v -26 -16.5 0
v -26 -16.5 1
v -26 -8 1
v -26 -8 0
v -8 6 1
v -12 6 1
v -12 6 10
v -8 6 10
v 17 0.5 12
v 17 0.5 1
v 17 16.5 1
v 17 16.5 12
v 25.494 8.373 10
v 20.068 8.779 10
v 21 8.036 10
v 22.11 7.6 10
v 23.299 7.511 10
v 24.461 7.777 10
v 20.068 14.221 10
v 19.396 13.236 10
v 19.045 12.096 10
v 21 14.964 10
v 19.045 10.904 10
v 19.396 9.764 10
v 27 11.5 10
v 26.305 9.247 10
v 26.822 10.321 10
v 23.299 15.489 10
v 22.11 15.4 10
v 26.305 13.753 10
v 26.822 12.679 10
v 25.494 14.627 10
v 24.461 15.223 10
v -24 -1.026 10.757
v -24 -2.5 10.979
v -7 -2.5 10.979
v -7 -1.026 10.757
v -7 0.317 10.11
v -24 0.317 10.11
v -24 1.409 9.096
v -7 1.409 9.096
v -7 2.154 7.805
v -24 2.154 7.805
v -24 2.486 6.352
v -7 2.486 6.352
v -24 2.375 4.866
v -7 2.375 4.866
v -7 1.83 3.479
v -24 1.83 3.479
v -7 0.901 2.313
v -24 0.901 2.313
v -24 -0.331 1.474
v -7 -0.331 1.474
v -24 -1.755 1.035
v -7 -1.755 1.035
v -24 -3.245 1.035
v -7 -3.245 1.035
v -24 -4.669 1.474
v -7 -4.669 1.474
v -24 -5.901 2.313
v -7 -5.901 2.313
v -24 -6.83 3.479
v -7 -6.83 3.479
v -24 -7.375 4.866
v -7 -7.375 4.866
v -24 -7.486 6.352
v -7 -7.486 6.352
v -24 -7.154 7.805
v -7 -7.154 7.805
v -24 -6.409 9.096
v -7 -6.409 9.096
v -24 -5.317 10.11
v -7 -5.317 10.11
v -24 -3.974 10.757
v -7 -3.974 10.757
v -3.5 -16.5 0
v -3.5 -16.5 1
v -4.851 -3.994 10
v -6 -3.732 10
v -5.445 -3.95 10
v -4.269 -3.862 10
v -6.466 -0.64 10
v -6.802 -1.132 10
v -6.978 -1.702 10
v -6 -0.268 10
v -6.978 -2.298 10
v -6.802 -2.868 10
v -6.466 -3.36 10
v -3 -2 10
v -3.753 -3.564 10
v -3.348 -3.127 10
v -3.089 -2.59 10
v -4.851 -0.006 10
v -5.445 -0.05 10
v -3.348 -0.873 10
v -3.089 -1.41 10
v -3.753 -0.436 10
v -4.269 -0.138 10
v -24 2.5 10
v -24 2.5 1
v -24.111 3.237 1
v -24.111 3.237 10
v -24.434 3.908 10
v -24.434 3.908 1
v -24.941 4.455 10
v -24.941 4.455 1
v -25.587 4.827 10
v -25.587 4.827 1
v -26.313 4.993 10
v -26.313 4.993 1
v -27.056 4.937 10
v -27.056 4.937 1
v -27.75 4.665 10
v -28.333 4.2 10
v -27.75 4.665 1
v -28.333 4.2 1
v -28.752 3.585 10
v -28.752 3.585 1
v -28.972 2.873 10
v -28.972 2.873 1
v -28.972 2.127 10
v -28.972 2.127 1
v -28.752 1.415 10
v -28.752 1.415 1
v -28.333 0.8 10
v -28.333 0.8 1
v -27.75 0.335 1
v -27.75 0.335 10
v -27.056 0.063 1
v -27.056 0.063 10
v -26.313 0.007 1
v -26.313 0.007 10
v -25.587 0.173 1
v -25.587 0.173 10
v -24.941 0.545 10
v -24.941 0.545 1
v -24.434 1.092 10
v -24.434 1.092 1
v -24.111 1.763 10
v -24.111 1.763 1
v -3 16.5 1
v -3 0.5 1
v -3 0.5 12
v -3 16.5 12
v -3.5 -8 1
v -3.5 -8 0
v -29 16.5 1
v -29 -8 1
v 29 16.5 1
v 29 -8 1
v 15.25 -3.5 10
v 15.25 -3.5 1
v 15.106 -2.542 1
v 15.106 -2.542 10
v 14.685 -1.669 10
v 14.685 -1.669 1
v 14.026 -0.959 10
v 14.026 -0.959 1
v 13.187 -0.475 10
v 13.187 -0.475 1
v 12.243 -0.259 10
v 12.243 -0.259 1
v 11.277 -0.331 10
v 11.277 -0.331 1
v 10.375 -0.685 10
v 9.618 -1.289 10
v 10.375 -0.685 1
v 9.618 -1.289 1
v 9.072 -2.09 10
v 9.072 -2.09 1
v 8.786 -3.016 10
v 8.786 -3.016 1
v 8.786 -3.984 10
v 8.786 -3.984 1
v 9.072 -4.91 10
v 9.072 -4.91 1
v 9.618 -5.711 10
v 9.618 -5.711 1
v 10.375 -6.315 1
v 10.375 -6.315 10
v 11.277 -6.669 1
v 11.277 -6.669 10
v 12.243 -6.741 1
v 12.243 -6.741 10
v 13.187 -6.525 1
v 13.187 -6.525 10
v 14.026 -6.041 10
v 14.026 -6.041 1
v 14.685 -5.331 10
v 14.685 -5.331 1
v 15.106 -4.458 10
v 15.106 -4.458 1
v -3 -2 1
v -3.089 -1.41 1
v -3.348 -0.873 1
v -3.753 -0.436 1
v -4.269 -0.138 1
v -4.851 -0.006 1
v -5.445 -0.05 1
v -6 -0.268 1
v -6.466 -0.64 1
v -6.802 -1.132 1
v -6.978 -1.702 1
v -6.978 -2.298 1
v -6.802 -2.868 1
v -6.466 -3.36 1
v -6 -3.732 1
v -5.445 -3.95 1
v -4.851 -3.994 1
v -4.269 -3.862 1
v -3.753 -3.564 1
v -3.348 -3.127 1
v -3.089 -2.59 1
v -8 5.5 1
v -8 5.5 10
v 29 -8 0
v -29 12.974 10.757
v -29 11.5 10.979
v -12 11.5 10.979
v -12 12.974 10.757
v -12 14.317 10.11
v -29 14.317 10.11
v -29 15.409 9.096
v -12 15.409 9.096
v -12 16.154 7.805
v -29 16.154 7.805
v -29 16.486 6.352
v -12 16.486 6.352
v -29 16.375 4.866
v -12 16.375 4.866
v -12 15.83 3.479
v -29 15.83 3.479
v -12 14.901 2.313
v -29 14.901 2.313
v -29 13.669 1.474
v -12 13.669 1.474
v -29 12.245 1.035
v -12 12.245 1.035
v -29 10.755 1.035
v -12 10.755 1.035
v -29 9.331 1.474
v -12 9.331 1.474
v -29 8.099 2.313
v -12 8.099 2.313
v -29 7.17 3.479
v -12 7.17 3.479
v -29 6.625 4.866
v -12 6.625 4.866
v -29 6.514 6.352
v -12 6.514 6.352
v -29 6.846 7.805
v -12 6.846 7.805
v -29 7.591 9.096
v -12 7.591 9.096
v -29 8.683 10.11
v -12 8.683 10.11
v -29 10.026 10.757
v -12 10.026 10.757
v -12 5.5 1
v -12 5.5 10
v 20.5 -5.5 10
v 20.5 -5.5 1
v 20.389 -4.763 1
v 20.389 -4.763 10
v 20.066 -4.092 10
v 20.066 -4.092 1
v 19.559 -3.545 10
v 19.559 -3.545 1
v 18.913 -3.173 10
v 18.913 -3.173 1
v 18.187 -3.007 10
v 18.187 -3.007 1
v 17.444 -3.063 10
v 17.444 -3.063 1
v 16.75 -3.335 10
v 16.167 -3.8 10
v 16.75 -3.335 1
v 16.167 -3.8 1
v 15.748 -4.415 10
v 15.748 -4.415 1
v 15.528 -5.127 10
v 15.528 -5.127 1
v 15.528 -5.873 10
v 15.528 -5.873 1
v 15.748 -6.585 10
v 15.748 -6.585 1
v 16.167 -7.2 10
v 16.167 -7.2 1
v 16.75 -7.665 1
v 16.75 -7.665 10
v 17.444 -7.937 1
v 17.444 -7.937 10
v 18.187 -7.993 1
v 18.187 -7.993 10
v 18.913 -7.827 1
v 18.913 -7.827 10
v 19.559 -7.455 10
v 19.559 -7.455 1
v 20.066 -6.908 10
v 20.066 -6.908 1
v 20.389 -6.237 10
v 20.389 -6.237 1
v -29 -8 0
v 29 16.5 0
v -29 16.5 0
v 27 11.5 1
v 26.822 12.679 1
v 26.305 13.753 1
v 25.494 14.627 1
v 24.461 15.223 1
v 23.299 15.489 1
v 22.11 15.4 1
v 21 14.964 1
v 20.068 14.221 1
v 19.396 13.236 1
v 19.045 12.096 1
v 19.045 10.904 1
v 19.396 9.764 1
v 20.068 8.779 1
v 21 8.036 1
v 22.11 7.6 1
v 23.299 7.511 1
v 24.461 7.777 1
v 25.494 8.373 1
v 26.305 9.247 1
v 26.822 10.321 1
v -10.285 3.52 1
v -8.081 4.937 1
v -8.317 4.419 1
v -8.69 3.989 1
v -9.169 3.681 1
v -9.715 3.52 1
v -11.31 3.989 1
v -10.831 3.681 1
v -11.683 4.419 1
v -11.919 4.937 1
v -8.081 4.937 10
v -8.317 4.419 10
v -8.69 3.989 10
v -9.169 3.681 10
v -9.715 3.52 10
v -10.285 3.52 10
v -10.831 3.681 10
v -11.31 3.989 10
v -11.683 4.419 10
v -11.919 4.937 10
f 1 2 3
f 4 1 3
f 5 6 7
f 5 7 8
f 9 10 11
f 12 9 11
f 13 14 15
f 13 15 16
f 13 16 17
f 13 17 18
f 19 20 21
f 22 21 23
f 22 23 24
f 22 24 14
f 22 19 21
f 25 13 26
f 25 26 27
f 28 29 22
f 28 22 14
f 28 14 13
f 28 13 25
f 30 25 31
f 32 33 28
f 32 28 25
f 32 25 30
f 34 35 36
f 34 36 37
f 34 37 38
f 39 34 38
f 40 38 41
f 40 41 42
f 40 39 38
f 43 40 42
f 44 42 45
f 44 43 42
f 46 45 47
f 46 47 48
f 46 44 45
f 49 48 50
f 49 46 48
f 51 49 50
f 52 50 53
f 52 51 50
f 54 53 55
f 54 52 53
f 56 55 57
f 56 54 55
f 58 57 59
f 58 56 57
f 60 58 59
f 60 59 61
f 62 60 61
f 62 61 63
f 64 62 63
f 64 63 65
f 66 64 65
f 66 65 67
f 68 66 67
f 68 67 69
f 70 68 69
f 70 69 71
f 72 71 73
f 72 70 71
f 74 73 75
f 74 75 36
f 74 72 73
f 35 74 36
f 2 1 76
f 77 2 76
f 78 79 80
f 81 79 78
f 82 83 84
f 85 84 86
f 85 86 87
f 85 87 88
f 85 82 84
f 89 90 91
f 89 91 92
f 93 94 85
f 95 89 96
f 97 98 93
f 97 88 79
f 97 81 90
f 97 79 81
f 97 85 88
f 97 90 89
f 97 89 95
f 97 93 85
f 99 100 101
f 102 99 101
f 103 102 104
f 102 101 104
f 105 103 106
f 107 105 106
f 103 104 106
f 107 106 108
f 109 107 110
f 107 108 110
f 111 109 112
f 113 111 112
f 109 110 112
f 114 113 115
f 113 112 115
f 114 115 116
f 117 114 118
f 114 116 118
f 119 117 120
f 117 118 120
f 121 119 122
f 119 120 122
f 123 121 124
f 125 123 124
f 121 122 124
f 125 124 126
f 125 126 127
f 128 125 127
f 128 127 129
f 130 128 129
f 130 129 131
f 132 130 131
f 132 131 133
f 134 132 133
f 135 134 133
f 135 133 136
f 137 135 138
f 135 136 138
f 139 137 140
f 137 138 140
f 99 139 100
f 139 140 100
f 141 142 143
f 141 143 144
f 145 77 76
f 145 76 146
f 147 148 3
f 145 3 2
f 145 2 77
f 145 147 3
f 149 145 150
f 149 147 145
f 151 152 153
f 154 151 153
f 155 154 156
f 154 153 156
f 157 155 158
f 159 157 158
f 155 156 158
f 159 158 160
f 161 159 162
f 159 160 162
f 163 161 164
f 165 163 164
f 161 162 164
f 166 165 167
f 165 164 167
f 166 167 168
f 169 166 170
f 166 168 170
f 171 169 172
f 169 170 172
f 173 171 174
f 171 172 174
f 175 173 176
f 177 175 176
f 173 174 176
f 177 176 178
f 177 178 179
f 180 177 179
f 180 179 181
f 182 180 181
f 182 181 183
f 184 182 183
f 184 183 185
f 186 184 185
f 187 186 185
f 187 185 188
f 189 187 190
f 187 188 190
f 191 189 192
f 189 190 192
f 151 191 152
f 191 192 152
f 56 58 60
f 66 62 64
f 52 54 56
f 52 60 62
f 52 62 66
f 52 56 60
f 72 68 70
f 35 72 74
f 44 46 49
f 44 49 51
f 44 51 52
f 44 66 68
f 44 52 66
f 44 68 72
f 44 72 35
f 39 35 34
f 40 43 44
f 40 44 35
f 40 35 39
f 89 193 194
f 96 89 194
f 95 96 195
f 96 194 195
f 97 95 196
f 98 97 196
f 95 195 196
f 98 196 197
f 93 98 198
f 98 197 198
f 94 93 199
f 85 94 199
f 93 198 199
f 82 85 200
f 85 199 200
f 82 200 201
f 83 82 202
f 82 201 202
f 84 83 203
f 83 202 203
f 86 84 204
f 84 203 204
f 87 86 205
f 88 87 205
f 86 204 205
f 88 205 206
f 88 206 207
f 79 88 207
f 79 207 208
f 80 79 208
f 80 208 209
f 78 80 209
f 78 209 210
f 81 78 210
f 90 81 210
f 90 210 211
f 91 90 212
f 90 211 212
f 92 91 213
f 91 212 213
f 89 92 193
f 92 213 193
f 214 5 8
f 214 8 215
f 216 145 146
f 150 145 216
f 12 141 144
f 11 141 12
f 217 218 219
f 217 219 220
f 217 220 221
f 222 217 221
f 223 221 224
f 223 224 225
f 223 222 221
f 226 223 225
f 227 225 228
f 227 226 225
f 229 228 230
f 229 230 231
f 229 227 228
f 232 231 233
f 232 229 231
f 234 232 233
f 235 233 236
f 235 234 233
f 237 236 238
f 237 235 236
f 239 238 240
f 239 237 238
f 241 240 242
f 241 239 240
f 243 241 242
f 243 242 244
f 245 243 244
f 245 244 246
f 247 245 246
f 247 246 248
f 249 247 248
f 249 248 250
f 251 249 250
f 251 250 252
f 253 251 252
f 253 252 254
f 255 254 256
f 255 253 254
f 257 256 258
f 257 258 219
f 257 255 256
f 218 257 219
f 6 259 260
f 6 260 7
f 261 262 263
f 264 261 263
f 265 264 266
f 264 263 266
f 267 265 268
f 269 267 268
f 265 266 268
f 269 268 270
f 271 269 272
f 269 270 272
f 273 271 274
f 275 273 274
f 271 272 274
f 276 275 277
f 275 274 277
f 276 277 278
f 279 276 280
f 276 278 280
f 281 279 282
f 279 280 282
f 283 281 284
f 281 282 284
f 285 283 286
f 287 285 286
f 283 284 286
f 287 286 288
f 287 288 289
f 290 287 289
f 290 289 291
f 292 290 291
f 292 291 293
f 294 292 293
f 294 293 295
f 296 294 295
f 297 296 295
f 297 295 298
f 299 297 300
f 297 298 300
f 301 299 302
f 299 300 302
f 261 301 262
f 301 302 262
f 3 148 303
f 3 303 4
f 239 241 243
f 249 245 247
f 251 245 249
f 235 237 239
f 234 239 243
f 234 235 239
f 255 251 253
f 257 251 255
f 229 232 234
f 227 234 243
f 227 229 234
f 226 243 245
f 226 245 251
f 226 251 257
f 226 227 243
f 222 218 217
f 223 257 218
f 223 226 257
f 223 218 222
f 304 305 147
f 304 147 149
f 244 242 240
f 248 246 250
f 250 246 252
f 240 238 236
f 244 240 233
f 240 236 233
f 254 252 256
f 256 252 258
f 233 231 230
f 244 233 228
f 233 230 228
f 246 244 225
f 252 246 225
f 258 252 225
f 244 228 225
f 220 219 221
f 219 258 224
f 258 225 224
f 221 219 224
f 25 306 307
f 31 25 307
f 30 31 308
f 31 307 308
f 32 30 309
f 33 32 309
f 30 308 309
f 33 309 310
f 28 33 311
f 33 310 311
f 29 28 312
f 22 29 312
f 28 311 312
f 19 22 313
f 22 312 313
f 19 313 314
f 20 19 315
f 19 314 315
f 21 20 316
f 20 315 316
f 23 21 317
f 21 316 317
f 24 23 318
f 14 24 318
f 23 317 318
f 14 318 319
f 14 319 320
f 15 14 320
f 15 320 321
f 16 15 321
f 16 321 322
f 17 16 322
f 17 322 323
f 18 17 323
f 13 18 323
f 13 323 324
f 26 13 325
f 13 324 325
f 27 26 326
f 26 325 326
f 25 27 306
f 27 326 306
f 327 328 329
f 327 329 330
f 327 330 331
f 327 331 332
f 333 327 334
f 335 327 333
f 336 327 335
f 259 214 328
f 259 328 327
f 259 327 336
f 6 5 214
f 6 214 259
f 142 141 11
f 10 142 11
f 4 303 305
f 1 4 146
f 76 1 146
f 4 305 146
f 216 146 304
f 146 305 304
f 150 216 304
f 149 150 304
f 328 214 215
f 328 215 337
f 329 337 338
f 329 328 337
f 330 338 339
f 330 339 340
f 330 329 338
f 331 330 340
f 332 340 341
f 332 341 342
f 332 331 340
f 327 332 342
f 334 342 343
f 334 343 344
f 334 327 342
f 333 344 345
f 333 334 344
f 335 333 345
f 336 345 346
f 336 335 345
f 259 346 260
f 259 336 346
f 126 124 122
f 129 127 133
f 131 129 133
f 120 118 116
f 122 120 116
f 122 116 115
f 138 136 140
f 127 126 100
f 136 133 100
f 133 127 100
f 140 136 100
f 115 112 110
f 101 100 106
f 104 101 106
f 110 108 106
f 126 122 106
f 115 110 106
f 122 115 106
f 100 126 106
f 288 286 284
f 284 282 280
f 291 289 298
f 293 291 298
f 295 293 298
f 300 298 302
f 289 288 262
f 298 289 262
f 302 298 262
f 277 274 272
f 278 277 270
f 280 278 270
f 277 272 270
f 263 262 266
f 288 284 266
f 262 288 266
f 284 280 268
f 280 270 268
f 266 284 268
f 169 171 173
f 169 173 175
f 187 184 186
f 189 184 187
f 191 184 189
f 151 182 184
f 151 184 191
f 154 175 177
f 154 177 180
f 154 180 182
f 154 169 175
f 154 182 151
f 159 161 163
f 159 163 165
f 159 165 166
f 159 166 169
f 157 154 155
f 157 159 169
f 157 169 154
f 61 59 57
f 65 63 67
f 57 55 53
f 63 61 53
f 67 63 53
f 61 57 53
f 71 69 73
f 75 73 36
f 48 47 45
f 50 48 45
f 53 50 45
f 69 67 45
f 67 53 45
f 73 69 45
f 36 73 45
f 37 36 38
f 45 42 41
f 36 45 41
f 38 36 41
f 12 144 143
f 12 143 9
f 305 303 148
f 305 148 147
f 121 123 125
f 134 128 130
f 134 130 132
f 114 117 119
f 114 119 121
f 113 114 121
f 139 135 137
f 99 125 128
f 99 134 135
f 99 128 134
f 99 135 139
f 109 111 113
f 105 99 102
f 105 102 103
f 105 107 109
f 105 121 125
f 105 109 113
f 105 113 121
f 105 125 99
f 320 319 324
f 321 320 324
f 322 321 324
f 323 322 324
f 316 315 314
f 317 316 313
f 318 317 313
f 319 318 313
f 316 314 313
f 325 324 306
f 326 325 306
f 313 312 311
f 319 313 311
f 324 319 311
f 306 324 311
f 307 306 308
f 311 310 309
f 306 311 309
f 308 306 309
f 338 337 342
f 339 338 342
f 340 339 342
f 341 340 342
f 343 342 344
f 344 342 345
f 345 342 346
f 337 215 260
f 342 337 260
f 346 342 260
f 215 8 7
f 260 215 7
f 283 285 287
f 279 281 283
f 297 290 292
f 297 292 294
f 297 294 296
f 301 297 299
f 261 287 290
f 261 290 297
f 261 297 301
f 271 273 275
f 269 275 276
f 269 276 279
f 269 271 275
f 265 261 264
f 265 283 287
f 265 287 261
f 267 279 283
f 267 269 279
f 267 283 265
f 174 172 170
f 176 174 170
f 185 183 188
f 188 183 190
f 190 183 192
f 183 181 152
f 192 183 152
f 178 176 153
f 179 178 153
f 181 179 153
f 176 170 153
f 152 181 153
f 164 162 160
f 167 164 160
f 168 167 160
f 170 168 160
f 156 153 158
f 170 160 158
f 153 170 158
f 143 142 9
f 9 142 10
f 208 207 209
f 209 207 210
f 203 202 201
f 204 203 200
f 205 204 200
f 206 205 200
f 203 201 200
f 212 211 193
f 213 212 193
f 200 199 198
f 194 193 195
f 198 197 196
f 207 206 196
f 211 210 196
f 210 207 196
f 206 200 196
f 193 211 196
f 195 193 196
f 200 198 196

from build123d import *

# Parameters (mm, degrees)
ESBO_O1_W                  = 58
ESBO_O1_H                  = 33
RESSALTO_EXTRUS_O1_DEPTH   = 1
ESBO_O2_W                  = 3
ESBO_O2_H                  = 8.5
ESBO_O2_W_2                = 32.5
CORTE_EXTRUS_O1_DEPTH      = 2
ESBO_O3_W                  = 20
ESBO_O3_H                  = 16
RESSALTO_EXTRUS_O2_DEPTH   = 11
ESBO_O4_R                  = 3.25
RESSALTO_EXTRUS_O3_DEPTH   = 9
ESBO_O4_R_2                = 2.5
RESSALTO_EXTRUS_O3_2_DEPTH = 9
ESBO_O4_R_3                = 4
RESSALTO_EXTRUS_O3_3_DEPTH = 9
RESSALTO_EXTRUS_O3_4_DEPTH = 9
ESBO_O4_R_4                = 2
RESSALTO_EXTRUS_O3_5_DEPTH = 9
RESSALTO_EXTRUS_O3_6_DEPTH = 9
ESBO_O5_R                  = 5
RESSALTO_EXTRUS_O4_DEPTH   = 17
RESSALTO_EXTRUS_O5_START   = -5
ESBO_O6_R                  = 5
RESSALTO_EXTRUS_O5_DEPTH   = 17


with BuildPart() as part:
    # Esboço1 → Ressalto-extrusão1 (new body)
    with BuildSketch(Plane.XY):
        Rectangle(ESBO_O1_W, ESBO_O1_H)
    extrude(amount=RESSALTO_EXTRUS_O1_DEPTH)

    # Esboço2 → Corte-extrusão1 (cut, through all)
    with BuildSketch(Plane.XY.offset(1)):
        with Locations((-27.5, -12.25)):
            Rectangle(ESBO_O2_W, ESBO_O2_H)
        with Locations((12.75, -12.25)):
            Rectangle(ESBO_O2_W_2, ESBO_O2_H)
    extrude(amount=-CORTE_EXTRUS_O1_DEPTH, mode=Mode.SUBTRACT)


with BuildPart() as body_2:
    # Esboço3 → Ressalto-extrusão2 (new body)
    with BuildSketch(Plane.XY.offset(1)):
        with Locations((7, 8.5)):
            Rectangle(ESBO_O3_W, ESBO_O3_H)
    extrude(amount=RESSALTO_EXTRUS_O2_DEPTH)


with BuildPart() as body_3:
    # Esboço4 → Ressalto-extrusão3 (new body)
    with BuildSketch(Plane.XY.offset(1)):
        with Locations((12, -3.5)):
            Circle(ESBO_O4_R)
    extrude(amount=RESSALTO_EXTRUS_O3_DEPTH)


with BuildPart() as body_4:
    # Esboço4 → Ressalto-extrus_o3 2 (new body)
    with BuildSketch(Plane.XY.offset(1)):
        with Locations((18, -5.5)):
            Circle(ESBO_O4_R_2)
    extrude(amount=RESSALTO_EXTRUS_O3_2_DEPTH)


with BuildPart() as body_5:
    # Esboço4 → Ressalto-extrus_o3 3 (new body)
    with BuildSketch(Plane.XY.offset(1)):
        with Locations((23, 11.5)):
            Circle(ESBO_O4_R_3)
    extrude(amount=RESSALTO_EXTRUS_O3_3_DEPTH)


with BuildPart() as body_6:
    # Esboço4 → Ressalto-extrus_o3 4 (new body)
    with BuildSketch(Plane.XY.offset(1)):
        with Locations((-26.5, 2.5)):
            Circle(ESBO_O4_R_2)
    extrude(amount=RESSALTO_EXTRUS_O3_4_DEPTH)


with BuildPart() as body_7:
    # Esboço4 → Ressalto-extrus_o3 5 (new body)
    with BuildSketch(Plane.XY.offset(1)):
        with Locations((-5, -2)):
            Circle(ESBO_O4_R_4)
    extrude(amount=RESSALTO_EXTRUS_O3_5_DEPTH)


with BuildPart() as body_8:
    # Esboço4 → Ressalto-extrus_o3 6 (new body)
    with BuildSketch(Plane.XY.offset(1)):
        with BuildLine():
            Line((-12, 6), (-8, 6))
            Line((-8, 6), (-8, 5.5))
            ThreePointArc((-8, 5.5), (-10, 3.5), (-12, 5.5))
            Line((-12, 5.5), (-12, 6))
        make_face()
    extrude(amount=RESSALTO_EXTRUS_O3_6_DEPTH)


with BuildPart() as body_9:
    # Esboço5 → Ressalto-extrusão4 (new body)
    with BuildSketch(Plane.ZY.offset(29)):
        with Locations((5.978654941, 11.5)):
            Circle(ESBO_O5_R)
    extrude(amount=-RESSALTO_EXTRUS_O4_DEPTH)


with BuildPart() as body_10:
    # Esboço6 → Ressalto-extrusão5 (new body)
    with BuildSketch(Plane.ZY.offset(29).offset(RESSALTO_EXTRUS_O5_START)):
        with Locations((5.978654941, -2.5)):
            Circle(ESBO_O6_R)
    extrude(amount=-RESSALTO_EXTRUS_O5_DEPTH)


solid = Compound([part.part, body_2.part, body_3.part, body_4.part, body_5.part, body_6.part, body_7.part, body_8.part, body_9.part, body_10.part])
